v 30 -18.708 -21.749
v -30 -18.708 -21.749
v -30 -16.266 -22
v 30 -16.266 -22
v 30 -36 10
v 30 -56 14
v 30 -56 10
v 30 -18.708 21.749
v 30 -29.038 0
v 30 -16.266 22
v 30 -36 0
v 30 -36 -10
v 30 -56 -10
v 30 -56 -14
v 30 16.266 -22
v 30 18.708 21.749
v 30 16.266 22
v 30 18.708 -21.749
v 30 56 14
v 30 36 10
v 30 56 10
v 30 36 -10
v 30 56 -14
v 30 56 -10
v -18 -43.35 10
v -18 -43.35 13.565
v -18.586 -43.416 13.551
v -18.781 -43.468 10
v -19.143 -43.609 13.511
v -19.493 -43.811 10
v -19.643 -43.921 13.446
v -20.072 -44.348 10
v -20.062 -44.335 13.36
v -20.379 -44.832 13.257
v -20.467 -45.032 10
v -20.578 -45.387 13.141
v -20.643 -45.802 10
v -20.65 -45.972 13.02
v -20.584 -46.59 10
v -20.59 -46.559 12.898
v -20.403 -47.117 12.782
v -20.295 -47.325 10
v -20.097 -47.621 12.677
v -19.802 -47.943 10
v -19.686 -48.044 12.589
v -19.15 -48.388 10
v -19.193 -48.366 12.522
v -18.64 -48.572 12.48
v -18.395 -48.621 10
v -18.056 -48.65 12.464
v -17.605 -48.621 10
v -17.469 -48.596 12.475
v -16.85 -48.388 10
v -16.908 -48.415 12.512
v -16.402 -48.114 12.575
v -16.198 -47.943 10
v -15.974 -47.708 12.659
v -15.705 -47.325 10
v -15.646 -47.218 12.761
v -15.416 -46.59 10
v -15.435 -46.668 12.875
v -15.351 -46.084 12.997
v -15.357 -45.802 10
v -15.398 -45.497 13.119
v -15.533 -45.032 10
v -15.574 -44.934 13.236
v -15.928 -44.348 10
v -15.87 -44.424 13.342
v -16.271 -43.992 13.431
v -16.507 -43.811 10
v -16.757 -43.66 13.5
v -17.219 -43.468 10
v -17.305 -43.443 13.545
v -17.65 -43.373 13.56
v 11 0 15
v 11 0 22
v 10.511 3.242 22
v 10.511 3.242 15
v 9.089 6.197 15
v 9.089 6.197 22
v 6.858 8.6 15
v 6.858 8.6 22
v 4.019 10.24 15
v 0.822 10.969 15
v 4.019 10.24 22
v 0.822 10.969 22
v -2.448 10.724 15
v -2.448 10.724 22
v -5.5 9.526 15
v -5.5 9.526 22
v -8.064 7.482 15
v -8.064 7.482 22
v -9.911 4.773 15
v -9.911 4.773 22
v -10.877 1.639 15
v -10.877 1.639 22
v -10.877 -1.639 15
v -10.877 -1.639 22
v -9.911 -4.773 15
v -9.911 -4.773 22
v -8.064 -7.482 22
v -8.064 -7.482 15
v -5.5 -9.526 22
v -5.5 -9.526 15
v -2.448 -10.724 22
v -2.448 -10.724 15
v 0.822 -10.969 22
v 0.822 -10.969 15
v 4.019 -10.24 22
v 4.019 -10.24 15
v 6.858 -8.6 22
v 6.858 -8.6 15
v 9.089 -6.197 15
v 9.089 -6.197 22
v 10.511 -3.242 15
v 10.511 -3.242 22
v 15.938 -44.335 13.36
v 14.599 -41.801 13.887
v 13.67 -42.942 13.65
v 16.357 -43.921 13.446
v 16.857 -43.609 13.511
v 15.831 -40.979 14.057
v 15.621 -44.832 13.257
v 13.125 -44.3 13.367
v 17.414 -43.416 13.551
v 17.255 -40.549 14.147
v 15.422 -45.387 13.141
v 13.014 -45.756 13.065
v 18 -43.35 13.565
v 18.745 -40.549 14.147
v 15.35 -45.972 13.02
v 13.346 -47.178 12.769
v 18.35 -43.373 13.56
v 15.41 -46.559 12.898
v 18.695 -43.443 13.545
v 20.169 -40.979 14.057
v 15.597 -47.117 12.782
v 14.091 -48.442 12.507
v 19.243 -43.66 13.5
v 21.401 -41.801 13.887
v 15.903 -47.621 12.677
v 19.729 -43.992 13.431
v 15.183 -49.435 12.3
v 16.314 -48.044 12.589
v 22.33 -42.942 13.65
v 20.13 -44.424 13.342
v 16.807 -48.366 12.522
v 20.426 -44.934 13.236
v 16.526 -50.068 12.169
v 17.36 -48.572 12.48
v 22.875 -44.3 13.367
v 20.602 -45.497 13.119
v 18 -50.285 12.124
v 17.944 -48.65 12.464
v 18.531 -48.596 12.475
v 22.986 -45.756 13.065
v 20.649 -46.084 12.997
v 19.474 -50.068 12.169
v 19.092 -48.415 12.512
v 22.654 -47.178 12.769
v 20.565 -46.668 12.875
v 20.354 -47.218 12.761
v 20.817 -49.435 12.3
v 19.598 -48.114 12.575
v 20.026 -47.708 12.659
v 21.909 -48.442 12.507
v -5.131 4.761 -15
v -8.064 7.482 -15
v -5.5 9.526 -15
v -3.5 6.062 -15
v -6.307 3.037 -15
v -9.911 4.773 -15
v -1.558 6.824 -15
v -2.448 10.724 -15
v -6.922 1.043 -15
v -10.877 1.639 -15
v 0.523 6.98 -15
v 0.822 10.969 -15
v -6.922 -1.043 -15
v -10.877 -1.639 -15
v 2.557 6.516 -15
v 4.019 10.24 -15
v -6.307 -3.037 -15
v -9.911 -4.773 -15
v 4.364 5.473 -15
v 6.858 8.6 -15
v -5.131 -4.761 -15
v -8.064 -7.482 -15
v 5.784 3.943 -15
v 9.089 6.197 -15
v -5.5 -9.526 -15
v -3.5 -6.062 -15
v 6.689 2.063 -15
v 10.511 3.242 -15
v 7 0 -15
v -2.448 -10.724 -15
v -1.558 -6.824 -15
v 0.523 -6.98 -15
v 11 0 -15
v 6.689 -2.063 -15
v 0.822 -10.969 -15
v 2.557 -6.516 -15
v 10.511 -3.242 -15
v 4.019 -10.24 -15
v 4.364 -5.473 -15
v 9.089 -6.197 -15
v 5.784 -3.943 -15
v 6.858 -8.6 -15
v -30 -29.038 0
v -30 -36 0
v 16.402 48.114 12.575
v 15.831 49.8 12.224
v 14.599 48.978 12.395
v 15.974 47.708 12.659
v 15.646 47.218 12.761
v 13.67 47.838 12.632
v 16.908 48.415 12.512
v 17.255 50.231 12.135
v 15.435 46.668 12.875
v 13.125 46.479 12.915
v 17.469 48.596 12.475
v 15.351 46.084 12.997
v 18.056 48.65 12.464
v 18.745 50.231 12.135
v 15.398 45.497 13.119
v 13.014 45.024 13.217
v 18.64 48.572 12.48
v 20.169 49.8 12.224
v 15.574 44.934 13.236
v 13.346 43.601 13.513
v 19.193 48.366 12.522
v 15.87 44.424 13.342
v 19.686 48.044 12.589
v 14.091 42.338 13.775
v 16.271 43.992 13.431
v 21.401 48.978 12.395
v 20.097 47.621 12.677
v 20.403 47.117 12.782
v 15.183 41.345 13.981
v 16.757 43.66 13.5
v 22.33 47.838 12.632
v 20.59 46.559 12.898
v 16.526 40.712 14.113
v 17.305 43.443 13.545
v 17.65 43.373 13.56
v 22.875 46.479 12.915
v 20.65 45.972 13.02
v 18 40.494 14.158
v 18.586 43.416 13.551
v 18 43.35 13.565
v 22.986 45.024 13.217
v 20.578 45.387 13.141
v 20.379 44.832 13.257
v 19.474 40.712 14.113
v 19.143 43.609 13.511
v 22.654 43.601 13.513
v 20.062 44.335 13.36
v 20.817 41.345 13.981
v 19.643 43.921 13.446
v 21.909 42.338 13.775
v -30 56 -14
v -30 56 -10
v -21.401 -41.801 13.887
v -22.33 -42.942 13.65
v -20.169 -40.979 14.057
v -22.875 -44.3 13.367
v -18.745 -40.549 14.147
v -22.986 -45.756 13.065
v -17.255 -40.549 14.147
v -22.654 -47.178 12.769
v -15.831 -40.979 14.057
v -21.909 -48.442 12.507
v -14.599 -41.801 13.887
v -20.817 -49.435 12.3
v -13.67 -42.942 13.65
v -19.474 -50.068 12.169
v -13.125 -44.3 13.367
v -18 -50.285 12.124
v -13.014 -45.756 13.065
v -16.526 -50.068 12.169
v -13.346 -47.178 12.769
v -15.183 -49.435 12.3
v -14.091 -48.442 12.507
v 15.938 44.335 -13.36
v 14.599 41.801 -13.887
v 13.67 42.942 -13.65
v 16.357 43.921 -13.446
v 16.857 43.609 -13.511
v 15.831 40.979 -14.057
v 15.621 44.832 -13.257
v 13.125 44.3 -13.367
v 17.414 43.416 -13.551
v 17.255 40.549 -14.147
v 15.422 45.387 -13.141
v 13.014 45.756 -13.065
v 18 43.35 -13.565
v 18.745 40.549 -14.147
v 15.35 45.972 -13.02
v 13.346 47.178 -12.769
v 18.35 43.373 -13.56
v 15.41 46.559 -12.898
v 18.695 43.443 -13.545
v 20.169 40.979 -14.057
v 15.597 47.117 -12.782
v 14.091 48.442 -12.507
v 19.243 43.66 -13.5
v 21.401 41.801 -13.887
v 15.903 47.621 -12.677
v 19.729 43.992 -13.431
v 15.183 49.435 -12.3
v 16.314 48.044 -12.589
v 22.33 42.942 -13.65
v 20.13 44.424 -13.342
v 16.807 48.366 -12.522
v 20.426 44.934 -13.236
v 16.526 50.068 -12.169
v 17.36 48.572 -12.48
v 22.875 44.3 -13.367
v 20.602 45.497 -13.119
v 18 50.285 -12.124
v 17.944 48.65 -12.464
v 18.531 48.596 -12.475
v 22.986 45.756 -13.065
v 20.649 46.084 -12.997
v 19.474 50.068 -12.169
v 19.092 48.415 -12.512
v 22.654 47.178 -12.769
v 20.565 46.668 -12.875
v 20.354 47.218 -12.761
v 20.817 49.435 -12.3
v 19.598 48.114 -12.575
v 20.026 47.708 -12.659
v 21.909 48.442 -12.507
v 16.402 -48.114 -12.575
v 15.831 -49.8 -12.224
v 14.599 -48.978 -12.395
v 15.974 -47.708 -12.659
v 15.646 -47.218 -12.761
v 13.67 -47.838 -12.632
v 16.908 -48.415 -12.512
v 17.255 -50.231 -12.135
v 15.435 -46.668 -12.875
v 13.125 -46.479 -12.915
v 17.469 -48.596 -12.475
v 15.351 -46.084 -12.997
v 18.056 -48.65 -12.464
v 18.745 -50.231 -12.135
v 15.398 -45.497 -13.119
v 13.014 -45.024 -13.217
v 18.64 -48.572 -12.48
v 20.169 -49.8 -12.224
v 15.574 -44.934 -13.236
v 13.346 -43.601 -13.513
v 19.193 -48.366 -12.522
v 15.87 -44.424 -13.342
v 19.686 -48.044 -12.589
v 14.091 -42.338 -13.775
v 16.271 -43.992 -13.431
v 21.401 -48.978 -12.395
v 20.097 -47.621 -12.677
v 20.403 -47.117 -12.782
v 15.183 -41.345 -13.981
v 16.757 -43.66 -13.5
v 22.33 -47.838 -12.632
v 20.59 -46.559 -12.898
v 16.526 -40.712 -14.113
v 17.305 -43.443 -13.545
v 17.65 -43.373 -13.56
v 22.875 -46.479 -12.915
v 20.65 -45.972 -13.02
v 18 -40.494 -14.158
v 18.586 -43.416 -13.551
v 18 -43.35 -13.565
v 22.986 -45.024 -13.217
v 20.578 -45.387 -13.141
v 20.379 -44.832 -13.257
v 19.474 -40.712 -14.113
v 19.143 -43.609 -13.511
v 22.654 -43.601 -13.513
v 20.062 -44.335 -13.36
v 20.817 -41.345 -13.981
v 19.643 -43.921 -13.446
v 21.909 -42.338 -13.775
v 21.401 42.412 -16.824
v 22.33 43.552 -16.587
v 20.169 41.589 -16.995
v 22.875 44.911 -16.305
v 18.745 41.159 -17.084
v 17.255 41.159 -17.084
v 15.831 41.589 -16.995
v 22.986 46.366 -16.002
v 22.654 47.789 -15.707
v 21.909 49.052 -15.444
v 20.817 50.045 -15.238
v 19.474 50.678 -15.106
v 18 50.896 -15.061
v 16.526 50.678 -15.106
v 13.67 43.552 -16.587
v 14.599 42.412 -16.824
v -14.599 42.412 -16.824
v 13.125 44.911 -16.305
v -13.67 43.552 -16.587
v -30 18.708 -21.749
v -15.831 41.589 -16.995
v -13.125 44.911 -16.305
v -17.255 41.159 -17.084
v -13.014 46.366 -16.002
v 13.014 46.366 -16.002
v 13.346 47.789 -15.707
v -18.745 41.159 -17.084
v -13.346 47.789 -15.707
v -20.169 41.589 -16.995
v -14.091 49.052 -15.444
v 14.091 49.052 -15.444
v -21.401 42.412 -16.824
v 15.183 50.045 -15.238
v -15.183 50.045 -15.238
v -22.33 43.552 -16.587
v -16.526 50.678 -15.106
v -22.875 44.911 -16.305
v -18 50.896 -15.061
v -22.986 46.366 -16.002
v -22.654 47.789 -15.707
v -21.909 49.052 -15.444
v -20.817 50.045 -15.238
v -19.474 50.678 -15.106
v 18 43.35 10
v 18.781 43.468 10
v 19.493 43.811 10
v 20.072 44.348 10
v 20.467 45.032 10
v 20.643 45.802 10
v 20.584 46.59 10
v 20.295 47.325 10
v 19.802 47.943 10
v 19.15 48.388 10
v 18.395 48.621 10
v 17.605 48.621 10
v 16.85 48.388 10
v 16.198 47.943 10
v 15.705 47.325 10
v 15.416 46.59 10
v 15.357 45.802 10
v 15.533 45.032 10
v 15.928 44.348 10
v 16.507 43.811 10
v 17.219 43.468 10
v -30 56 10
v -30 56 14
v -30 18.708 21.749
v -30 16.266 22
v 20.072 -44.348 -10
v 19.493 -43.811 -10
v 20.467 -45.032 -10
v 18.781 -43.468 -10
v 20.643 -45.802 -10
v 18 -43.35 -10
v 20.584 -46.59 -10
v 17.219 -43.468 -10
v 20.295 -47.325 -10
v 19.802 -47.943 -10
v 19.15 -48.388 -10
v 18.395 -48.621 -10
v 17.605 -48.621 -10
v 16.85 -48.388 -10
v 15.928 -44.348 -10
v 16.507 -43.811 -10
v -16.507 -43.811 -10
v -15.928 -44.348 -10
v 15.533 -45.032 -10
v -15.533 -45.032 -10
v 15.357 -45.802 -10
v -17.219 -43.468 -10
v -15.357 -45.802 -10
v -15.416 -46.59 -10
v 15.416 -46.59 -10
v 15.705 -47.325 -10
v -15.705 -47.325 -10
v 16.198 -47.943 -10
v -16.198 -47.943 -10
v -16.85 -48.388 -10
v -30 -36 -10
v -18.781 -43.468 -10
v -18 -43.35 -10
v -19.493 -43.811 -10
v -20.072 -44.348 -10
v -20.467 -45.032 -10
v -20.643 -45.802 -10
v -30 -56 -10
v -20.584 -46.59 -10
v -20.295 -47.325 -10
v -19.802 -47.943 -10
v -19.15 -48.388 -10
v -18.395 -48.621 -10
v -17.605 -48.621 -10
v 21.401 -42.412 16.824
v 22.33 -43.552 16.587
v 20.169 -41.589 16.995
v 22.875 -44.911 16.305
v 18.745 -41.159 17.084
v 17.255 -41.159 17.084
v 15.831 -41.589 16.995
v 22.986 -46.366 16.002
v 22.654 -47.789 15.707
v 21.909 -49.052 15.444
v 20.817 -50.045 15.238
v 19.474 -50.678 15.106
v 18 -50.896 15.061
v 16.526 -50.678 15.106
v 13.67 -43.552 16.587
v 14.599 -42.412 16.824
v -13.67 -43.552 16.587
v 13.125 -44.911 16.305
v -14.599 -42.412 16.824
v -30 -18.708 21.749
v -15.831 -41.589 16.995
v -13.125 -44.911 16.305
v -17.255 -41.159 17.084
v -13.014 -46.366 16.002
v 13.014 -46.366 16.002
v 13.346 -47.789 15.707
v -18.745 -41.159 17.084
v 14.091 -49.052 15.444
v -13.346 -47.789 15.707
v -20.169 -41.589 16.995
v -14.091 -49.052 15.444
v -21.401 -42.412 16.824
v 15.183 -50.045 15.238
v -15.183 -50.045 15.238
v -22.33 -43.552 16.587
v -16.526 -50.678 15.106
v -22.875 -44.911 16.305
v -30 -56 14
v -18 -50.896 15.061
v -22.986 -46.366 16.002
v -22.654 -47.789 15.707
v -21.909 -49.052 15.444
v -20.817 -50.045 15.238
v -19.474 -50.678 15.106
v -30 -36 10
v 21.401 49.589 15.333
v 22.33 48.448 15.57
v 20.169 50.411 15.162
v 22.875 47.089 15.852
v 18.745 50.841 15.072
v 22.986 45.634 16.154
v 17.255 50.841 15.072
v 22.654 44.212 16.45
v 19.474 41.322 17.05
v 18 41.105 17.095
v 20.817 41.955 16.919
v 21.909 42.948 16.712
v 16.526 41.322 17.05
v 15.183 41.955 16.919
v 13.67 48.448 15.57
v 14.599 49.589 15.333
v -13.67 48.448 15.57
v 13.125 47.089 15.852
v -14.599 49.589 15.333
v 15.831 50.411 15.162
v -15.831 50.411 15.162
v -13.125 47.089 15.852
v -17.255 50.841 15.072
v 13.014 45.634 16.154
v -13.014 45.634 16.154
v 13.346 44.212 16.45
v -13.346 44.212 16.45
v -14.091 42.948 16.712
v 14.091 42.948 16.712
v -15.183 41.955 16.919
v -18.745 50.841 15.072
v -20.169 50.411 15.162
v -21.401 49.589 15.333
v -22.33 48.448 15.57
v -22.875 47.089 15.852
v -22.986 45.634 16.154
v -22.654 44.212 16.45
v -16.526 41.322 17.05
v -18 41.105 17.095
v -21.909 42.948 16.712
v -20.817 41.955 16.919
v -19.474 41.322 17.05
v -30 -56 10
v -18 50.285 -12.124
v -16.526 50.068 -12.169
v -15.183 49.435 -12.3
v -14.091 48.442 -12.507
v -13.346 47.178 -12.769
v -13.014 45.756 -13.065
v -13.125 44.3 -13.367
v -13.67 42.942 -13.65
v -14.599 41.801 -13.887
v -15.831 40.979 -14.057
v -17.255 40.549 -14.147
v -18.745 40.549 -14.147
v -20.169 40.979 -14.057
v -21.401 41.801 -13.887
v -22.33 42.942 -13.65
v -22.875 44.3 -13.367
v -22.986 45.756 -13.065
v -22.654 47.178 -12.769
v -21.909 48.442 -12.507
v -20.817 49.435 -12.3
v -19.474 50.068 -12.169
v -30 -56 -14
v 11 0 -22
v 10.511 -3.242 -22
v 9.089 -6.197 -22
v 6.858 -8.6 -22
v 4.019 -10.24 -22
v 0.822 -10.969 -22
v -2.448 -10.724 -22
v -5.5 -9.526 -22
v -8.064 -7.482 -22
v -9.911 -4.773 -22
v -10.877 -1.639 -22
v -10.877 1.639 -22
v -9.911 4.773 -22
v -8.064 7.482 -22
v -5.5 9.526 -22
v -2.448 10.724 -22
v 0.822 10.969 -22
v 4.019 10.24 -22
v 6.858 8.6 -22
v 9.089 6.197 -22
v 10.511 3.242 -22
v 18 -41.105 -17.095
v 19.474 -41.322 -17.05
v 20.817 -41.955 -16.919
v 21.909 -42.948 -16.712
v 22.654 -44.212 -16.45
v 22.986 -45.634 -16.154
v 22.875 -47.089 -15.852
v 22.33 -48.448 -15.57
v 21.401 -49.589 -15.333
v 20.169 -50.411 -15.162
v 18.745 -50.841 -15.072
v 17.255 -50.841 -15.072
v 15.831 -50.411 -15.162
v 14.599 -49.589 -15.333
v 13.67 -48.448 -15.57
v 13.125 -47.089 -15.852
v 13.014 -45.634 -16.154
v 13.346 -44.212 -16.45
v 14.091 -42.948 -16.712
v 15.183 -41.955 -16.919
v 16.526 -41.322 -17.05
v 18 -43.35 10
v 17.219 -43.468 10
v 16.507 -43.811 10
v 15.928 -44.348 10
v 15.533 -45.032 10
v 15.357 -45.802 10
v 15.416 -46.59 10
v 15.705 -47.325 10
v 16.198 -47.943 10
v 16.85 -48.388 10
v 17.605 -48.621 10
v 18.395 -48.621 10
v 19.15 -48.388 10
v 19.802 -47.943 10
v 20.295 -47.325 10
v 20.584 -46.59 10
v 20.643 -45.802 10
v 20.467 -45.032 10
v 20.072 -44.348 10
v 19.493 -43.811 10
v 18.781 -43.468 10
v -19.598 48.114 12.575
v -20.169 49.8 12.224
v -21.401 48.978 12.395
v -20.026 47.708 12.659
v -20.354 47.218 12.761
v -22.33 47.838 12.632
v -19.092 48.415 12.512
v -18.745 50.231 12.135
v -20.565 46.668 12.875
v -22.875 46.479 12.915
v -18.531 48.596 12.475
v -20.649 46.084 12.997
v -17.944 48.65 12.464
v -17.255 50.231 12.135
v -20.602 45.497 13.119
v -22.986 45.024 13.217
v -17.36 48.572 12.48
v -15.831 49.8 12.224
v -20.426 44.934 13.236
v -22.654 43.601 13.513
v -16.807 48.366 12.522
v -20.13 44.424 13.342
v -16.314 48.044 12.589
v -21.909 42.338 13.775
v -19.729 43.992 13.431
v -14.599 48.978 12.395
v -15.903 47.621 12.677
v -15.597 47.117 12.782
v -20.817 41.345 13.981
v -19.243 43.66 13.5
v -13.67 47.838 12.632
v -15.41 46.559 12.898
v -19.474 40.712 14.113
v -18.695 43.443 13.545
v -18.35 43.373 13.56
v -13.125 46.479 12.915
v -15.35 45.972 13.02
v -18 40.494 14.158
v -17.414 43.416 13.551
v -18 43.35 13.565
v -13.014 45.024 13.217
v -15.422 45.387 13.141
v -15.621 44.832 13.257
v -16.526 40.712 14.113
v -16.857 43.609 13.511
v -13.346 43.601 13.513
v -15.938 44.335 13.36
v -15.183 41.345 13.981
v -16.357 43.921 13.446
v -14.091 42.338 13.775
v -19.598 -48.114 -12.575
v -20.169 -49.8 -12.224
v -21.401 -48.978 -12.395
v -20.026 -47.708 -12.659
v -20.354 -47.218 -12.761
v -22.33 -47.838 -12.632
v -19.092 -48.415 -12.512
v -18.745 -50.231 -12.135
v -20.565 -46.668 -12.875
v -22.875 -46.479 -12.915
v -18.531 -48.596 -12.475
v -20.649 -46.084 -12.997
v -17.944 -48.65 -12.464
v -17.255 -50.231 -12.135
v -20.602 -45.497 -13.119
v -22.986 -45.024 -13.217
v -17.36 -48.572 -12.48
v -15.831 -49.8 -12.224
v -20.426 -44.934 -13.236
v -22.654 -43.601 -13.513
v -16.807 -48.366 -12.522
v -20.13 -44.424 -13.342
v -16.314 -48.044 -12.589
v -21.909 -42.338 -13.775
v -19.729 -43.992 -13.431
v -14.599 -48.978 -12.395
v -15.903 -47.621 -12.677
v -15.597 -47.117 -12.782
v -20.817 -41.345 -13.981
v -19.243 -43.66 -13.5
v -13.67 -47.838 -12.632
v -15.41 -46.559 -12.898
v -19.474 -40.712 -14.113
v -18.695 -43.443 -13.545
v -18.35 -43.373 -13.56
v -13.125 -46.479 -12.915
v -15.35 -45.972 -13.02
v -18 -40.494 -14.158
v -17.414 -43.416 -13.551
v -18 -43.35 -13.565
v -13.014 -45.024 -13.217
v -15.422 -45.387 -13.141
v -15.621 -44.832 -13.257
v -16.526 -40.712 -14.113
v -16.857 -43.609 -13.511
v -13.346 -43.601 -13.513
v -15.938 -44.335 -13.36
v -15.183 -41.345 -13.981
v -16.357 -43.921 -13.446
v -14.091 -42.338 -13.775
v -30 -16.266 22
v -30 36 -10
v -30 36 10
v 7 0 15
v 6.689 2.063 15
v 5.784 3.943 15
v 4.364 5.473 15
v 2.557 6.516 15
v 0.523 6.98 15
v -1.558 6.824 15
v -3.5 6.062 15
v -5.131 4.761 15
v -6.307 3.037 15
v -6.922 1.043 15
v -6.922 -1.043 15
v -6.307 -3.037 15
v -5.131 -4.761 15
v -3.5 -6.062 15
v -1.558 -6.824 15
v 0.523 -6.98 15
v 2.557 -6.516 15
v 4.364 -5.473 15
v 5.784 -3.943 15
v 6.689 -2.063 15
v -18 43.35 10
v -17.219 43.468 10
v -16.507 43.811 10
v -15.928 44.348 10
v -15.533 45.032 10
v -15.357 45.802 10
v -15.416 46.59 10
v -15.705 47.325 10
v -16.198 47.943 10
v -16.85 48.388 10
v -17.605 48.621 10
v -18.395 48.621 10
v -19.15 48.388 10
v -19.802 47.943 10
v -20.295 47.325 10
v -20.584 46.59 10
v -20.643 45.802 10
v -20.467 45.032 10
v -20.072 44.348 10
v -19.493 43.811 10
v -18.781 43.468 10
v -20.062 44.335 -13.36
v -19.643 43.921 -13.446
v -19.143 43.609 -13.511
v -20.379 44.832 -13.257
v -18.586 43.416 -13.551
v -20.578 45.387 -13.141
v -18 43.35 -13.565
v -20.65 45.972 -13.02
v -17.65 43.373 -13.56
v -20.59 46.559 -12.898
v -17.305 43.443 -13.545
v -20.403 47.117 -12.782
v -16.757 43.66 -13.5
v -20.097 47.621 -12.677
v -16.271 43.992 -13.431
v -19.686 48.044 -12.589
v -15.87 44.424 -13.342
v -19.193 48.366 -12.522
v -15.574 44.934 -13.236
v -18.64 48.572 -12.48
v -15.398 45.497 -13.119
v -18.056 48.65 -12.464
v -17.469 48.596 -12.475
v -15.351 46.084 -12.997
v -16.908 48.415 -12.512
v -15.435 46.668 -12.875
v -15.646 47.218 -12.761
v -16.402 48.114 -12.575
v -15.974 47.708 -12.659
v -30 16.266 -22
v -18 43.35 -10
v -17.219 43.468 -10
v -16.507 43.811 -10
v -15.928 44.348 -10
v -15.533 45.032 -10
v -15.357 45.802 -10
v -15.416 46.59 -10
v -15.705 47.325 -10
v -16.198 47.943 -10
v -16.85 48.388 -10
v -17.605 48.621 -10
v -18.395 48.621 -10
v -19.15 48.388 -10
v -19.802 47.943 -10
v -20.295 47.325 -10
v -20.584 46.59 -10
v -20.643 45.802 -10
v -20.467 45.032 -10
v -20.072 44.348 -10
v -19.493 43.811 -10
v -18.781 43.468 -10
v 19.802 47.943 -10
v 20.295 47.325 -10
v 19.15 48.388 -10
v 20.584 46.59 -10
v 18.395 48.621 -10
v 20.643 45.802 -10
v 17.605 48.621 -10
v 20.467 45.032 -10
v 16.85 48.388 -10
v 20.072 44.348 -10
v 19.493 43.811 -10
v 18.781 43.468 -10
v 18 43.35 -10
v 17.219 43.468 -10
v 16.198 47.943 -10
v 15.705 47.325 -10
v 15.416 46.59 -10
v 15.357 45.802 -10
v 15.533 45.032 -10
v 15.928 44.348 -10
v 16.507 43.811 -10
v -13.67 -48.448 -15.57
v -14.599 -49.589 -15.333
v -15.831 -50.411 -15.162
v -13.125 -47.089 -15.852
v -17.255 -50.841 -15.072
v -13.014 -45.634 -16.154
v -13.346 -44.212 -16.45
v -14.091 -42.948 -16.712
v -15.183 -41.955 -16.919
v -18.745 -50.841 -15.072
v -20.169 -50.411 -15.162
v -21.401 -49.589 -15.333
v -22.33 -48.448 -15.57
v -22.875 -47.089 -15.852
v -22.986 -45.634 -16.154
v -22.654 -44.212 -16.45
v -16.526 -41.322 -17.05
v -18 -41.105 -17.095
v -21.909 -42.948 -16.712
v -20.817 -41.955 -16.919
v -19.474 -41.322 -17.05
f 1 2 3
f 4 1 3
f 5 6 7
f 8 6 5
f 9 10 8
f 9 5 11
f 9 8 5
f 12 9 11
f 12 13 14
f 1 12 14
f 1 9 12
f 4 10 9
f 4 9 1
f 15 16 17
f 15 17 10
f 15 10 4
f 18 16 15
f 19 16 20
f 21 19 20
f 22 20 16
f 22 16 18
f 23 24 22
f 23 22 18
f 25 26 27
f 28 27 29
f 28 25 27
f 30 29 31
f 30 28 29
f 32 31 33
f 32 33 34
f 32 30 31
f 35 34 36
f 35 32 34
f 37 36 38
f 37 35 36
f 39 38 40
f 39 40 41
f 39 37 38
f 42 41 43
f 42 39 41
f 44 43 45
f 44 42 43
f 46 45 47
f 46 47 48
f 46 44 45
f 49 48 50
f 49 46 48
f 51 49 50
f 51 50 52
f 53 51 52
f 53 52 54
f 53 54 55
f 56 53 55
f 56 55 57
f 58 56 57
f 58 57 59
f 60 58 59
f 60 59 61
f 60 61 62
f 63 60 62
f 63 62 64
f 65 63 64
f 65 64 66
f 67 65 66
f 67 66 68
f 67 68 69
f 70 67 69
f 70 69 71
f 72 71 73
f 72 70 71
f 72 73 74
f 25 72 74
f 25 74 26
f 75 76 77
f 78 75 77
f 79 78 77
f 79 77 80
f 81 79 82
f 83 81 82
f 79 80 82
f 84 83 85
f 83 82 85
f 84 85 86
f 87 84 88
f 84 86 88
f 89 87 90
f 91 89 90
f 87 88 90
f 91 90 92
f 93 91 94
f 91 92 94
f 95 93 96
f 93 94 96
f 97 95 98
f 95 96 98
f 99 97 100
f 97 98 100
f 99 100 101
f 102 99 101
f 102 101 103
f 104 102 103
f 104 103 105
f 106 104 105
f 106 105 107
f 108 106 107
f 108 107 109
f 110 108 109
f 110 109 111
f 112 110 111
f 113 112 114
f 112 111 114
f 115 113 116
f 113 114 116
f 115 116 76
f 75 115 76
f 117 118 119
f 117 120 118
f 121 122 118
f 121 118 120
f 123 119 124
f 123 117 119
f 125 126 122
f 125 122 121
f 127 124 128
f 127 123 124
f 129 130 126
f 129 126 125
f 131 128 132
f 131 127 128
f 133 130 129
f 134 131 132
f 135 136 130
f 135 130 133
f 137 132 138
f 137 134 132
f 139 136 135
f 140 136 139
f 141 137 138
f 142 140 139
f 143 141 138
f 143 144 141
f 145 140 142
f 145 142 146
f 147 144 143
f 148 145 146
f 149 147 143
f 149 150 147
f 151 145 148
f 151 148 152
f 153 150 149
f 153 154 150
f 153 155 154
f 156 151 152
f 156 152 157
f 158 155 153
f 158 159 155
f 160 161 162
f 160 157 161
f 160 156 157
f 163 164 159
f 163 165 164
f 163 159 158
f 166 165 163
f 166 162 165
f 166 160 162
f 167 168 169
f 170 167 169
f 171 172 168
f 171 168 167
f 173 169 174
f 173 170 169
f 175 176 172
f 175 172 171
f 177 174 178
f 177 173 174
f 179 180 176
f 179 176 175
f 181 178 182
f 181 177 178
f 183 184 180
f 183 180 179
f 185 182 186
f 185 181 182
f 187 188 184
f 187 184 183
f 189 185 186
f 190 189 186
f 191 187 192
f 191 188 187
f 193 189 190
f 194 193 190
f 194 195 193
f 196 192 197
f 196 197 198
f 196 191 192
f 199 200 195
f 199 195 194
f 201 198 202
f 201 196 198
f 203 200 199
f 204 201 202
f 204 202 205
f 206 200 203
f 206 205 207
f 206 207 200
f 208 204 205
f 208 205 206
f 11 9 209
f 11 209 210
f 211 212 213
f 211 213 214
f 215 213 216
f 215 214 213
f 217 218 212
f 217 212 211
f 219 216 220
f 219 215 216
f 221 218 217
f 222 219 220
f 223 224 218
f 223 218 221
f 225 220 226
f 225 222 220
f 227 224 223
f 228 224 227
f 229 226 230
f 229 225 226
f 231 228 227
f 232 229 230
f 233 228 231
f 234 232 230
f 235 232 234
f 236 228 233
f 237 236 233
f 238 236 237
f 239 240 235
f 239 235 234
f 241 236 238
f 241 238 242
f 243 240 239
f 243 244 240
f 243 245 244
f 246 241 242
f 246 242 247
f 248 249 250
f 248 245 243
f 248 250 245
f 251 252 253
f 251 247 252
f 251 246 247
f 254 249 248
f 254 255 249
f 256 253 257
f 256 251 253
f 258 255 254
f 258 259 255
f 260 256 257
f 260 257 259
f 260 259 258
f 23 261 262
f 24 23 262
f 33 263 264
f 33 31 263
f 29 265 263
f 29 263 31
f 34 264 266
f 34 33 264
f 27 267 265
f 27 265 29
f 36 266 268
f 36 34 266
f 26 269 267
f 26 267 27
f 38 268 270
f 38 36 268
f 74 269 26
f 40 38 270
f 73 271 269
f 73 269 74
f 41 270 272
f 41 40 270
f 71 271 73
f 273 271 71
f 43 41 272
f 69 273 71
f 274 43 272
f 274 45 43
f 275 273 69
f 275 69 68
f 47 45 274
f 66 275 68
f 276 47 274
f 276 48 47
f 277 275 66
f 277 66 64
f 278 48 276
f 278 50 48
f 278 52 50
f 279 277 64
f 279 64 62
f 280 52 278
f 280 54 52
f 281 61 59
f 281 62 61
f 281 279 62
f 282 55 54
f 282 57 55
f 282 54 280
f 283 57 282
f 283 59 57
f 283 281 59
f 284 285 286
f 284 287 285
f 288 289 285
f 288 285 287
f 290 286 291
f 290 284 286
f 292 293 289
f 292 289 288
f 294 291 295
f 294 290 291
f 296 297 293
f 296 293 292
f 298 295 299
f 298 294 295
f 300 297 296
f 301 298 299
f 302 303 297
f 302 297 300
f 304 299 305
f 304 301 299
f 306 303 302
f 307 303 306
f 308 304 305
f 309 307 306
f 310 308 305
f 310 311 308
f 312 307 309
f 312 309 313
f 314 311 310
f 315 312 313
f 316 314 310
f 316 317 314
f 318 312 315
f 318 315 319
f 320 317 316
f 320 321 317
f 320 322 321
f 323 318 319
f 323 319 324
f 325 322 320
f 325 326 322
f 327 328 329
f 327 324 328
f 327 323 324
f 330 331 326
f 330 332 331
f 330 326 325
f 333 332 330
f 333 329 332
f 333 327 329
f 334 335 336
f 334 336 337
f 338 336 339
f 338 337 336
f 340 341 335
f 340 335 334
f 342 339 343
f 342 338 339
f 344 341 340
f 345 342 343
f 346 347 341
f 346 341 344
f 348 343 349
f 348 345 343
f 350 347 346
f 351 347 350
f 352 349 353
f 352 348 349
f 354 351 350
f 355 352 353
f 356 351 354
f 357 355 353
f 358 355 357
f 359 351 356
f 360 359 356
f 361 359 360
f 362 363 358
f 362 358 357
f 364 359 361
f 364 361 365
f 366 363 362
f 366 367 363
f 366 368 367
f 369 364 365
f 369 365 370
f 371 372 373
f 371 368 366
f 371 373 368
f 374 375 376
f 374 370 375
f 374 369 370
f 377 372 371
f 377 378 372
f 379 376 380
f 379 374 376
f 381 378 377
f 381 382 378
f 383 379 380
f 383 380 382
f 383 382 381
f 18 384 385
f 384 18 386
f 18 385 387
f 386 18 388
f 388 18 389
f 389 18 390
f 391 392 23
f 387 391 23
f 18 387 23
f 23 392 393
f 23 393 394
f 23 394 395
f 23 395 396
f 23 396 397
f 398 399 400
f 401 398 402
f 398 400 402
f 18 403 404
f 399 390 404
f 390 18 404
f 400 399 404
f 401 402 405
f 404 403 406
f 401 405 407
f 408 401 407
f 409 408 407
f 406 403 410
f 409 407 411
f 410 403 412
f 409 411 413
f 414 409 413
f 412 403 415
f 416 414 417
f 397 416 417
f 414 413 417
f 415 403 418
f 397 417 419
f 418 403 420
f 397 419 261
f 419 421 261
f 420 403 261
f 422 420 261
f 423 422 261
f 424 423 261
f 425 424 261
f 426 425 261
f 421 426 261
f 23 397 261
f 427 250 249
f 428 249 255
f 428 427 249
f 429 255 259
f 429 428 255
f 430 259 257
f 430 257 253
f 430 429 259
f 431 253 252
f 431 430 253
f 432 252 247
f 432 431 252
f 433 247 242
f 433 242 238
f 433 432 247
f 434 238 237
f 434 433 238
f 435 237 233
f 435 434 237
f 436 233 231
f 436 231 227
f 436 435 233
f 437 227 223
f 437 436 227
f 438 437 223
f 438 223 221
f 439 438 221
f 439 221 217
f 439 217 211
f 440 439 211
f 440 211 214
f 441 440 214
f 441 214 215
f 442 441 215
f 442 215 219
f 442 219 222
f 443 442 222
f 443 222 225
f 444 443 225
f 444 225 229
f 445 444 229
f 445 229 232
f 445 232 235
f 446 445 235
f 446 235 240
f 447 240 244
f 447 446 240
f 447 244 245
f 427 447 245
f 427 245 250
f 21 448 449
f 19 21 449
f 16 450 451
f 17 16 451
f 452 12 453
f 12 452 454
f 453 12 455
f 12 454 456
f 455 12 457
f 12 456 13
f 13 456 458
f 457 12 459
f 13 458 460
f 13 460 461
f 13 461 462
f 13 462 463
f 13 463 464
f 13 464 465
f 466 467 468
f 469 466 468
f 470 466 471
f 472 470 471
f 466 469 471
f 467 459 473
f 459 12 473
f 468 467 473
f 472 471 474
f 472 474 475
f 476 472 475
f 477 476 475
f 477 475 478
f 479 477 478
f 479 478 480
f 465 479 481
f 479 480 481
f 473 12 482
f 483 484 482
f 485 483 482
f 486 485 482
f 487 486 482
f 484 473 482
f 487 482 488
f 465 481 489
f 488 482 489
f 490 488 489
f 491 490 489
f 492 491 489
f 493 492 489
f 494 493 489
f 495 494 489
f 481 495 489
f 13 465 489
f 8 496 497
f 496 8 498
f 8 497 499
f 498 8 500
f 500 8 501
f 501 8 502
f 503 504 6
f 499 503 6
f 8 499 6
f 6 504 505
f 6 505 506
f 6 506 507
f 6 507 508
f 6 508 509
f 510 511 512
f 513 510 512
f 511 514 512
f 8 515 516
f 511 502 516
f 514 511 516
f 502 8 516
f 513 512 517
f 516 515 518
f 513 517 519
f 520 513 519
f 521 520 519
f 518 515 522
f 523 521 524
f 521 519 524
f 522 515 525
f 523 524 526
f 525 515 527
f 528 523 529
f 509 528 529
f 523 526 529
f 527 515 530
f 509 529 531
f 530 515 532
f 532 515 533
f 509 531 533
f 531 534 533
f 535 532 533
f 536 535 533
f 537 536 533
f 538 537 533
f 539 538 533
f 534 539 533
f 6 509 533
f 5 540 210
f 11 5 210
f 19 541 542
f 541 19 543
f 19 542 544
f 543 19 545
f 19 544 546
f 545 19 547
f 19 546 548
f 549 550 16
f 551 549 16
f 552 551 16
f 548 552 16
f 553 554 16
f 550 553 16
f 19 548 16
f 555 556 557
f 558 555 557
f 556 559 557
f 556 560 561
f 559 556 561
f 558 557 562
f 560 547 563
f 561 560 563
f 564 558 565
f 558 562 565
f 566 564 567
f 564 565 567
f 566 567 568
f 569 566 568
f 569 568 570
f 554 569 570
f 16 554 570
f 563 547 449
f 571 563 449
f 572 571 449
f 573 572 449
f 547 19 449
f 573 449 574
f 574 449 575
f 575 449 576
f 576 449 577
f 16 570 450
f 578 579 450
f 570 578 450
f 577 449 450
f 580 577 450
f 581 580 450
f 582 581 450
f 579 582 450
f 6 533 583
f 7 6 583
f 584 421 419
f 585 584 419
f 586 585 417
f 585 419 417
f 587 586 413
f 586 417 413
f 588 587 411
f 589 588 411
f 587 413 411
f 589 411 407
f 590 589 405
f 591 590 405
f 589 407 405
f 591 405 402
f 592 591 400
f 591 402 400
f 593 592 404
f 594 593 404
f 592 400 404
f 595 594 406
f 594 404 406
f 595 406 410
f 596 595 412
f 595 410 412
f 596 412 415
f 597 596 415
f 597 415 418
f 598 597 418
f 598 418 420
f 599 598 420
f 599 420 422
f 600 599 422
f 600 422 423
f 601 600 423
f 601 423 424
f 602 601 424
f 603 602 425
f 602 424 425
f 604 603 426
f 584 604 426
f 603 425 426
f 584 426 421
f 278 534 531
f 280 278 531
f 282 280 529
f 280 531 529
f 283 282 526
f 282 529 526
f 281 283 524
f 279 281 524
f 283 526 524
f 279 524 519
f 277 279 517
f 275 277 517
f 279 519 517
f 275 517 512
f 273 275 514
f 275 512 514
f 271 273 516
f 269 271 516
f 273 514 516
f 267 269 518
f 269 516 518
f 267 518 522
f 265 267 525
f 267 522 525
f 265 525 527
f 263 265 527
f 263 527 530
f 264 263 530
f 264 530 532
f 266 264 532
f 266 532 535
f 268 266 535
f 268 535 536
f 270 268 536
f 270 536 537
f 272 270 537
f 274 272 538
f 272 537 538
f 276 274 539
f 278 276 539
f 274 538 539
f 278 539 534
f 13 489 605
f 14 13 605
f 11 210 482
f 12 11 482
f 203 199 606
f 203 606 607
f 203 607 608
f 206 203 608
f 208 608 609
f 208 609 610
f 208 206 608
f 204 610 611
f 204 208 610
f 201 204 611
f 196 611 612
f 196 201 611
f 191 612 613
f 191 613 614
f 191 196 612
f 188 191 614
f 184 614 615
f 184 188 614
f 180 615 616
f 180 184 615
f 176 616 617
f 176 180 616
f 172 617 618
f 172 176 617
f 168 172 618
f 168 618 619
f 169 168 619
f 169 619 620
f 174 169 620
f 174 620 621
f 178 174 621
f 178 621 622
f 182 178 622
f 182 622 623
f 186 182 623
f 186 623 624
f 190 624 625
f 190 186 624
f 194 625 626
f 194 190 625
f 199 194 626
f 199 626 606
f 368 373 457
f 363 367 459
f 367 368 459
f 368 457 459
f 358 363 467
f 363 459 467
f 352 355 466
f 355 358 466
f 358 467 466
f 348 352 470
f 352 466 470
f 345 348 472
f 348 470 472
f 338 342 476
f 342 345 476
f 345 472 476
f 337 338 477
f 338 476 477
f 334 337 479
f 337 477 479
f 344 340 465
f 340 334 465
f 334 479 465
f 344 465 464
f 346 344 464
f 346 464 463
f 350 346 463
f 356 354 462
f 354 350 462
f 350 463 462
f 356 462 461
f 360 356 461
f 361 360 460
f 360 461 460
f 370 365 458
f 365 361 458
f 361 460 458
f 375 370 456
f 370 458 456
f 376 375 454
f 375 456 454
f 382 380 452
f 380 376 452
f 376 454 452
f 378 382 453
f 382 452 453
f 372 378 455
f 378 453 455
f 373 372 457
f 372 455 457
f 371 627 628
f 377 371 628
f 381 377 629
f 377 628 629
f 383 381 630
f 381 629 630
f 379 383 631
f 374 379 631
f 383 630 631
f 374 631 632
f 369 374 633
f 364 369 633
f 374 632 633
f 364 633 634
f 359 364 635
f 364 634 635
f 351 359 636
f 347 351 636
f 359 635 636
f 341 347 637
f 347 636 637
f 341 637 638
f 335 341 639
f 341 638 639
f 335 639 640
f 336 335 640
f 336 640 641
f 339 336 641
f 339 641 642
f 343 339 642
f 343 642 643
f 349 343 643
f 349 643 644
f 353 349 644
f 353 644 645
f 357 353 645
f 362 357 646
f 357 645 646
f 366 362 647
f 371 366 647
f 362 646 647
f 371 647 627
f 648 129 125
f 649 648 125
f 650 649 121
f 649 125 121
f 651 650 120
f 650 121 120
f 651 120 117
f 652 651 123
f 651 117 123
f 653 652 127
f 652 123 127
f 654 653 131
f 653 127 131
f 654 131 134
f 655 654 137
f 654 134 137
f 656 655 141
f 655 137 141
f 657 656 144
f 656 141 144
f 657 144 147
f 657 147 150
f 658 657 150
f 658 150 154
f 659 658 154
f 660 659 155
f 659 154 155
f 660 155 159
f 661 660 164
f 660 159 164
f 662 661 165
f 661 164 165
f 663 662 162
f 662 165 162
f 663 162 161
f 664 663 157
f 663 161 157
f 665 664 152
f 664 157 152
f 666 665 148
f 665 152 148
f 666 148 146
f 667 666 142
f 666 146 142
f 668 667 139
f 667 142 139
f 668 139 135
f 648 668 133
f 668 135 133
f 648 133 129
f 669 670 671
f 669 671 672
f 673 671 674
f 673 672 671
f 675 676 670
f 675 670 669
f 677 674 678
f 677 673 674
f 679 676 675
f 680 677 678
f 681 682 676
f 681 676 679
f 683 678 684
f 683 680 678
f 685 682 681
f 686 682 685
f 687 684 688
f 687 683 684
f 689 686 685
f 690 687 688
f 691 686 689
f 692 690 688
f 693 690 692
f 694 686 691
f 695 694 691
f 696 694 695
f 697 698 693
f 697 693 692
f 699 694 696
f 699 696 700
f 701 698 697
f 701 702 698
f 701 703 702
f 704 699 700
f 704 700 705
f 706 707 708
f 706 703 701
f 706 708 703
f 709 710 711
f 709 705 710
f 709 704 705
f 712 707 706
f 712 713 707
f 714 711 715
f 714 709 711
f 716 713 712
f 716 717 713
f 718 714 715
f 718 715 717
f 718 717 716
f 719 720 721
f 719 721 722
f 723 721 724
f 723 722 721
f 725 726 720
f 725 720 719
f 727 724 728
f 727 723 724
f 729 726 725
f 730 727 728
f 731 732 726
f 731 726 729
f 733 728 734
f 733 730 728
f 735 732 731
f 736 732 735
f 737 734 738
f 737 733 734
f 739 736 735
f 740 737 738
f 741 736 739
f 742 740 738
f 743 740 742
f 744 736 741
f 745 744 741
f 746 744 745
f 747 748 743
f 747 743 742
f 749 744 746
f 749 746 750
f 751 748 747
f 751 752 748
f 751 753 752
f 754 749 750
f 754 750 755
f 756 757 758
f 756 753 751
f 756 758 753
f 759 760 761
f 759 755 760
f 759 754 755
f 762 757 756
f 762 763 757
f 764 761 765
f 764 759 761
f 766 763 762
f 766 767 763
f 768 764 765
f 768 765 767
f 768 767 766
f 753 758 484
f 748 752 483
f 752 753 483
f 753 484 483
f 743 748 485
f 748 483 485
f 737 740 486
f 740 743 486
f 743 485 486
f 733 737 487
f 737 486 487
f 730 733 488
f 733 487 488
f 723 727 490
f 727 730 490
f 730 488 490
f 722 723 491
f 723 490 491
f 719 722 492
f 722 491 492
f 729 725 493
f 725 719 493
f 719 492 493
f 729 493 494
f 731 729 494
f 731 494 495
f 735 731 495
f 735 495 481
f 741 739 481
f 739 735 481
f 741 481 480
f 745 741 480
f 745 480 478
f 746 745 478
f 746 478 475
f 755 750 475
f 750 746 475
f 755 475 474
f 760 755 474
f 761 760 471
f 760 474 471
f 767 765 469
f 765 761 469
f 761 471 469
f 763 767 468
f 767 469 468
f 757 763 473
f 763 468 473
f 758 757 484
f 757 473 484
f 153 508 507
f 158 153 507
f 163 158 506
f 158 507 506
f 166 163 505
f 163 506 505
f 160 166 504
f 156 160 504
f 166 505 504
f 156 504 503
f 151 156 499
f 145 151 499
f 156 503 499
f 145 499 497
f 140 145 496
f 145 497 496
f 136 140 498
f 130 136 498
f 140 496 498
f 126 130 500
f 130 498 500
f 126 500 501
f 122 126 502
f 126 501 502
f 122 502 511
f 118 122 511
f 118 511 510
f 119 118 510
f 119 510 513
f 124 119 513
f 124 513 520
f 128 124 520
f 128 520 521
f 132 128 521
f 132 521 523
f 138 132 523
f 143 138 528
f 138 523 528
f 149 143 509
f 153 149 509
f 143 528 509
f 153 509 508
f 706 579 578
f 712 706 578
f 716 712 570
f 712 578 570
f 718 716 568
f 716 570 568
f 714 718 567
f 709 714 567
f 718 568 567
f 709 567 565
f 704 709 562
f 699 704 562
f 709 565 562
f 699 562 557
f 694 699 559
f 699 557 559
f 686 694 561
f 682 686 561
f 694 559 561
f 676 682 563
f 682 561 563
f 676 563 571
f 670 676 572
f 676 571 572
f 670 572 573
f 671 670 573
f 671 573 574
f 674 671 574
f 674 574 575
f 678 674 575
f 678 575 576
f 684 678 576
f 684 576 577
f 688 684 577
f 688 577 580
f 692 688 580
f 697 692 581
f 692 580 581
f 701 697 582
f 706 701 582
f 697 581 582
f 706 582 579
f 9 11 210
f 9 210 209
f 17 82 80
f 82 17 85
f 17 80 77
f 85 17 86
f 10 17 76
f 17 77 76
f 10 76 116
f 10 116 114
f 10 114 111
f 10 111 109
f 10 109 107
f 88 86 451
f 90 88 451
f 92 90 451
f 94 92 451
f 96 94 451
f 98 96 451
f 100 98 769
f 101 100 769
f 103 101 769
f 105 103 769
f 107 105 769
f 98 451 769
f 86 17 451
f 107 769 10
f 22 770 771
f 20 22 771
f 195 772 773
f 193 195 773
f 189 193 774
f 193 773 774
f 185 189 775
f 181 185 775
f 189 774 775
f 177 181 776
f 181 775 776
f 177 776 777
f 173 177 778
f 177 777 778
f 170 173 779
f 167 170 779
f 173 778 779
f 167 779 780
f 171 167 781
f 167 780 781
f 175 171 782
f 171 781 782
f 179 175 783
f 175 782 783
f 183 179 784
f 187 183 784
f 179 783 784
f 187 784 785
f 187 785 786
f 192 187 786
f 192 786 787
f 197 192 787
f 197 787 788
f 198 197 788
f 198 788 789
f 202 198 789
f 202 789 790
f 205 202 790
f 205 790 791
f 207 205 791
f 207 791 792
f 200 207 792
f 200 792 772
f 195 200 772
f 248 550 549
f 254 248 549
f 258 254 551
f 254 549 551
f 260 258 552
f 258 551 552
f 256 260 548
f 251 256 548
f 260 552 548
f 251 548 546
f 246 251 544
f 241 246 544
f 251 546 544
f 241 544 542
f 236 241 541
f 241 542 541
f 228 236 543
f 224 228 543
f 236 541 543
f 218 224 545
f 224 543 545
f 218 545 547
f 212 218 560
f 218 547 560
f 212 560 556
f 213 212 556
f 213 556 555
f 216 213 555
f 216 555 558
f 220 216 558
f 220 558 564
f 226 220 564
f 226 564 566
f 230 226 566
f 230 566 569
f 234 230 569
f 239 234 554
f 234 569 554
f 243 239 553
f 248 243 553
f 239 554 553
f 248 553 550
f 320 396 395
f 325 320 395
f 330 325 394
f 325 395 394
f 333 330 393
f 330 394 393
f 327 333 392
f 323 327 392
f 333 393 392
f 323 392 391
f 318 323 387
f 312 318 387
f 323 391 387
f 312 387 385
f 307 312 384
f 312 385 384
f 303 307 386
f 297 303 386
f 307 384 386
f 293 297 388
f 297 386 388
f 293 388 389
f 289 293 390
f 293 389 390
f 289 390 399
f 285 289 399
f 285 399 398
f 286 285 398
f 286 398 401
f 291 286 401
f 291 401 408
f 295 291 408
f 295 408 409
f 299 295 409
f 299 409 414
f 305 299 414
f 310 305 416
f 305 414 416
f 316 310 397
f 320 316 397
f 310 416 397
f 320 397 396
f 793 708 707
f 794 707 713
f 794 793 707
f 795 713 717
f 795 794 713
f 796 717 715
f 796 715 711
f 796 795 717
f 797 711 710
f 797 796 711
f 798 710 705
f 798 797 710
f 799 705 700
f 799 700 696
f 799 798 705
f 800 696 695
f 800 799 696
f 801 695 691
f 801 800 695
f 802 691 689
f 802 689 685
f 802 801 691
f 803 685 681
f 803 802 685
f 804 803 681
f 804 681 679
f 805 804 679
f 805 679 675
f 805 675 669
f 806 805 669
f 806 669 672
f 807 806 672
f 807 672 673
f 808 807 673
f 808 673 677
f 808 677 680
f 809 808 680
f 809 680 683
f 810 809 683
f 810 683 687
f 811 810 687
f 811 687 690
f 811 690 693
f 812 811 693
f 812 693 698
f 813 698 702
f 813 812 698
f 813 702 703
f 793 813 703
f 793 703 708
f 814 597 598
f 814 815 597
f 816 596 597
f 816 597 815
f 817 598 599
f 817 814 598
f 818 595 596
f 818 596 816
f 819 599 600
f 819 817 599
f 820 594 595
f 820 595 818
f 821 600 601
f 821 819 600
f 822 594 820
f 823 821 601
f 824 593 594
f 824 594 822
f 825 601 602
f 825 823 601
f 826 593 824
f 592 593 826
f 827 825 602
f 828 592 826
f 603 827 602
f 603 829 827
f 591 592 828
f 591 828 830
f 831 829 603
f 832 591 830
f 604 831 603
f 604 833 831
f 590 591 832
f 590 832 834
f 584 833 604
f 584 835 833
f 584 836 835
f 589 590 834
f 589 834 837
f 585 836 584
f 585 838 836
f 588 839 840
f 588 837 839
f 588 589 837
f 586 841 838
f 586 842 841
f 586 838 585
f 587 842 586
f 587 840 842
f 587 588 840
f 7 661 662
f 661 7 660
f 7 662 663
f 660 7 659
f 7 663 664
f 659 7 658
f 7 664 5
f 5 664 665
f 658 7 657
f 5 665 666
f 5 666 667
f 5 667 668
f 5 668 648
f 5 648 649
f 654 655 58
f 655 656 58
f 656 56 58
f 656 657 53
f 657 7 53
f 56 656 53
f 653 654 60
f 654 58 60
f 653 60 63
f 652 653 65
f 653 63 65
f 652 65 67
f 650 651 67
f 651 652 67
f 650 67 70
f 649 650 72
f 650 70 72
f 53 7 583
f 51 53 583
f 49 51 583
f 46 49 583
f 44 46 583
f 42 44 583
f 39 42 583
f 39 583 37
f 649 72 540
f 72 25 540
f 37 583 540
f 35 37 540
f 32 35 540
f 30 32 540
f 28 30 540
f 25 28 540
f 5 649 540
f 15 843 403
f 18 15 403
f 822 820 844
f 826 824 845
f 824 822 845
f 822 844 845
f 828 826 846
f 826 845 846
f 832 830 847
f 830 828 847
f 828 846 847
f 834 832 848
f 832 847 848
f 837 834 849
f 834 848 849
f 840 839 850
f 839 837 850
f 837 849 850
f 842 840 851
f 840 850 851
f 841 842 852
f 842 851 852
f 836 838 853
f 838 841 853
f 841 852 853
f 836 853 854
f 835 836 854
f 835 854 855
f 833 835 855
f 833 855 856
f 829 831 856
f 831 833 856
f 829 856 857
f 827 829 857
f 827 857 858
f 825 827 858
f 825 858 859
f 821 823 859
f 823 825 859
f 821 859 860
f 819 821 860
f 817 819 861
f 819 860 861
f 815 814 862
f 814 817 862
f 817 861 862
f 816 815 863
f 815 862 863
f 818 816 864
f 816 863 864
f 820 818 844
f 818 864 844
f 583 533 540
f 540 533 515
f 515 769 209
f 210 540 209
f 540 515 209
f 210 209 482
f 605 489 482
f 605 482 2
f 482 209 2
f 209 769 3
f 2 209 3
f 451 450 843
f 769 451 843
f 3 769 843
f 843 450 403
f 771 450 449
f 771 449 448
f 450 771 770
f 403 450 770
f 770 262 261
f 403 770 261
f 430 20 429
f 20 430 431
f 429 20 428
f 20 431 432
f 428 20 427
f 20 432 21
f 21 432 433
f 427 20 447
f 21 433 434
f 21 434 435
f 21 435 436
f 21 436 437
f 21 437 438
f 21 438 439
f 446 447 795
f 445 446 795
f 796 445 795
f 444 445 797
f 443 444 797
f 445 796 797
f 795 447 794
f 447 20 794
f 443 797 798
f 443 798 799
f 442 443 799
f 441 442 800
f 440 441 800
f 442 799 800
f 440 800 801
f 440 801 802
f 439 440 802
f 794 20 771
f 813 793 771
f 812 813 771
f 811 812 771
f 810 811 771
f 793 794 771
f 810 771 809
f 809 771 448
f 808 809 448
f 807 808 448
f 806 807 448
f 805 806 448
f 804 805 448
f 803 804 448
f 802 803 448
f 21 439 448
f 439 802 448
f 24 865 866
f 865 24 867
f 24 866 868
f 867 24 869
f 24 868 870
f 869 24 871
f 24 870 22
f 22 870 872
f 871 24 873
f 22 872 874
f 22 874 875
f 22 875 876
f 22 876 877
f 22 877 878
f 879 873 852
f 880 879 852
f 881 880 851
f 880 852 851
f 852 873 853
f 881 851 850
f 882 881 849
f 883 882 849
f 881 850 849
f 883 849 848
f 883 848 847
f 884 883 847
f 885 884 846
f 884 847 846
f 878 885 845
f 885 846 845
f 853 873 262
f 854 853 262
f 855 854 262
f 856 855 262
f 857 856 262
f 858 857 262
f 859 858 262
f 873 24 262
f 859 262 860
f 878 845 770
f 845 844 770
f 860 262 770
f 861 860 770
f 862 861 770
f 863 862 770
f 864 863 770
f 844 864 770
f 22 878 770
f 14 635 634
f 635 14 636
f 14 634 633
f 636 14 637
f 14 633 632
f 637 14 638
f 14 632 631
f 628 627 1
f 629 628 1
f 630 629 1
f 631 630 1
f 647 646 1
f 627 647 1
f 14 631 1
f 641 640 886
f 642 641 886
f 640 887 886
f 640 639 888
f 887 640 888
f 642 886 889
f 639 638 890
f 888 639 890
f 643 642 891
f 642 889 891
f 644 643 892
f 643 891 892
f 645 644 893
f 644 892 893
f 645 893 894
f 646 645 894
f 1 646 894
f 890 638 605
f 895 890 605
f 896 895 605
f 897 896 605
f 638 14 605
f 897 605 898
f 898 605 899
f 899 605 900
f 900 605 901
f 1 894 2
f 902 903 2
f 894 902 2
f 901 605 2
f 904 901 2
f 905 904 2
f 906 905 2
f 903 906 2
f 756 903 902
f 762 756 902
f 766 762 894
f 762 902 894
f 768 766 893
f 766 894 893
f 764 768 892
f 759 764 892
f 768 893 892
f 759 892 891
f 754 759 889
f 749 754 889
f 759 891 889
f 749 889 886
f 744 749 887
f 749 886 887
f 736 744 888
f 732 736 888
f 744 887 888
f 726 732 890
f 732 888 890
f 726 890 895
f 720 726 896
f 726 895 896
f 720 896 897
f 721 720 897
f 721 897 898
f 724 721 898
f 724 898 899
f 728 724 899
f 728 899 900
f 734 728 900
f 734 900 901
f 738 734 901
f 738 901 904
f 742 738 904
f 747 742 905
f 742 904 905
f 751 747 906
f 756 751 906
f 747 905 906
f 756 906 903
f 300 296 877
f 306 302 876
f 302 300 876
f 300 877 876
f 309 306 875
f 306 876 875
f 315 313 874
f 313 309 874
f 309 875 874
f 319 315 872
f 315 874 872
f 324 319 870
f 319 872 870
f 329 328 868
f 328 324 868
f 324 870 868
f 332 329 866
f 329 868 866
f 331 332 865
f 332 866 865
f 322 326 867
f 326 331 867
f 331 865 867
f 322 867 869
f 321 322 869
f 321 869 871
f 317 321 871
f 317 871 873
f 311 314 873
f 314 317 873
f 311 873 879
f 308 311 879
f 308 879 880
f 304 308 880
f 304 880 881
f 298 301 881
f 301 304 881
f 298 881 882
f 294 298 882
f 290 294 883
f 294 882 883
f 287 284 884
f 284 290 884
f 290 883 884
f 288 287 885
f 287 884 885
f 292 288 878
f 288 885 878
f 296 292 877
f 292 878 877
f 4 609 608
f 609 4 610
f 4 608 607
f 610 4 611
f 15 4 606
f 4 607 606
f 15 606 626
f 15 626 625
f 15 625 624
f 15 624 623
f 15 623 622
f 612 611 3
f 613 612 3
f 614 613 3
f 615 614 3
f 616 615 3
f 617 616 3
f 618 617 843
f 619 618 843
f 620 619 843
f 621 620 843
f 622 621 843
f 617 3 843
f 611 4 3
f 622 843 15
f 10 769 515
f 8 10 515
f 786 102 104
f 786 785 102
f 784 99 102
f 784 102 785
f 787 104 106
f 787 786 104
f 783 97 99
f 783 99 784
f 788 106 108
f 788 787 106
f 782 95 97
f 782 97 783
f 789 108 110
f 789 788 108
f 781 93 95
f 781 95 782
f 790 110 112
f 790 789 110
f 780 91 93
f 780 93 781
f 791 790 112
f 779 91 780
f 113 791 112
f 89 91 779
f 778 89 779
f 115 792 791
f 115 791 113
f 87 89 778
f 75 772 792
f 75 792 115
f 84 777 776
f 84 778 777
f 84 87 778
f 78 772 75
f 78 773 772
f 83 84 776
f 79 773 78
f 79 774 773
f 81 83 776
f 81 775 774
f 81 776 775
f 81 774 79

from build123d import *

# Parameters (mm, degrees)
EXTRUIR_L_MINA1_START   = -30
EXTRUIR_L_MINA1_DEPTH   = 60
CROQUIS2_W              = 29.989677058
CROQUIS2_H              = 58.075247638
SALIENTE_EXTRUIR1_DEPTH = 30
CROQUIS3_R              = 7
CORTAR_EXTRUIR1_DEPTH   = 60
CROQUIS4_R              = 11
CORTAR_EXTRUIR2_DEPTH   = 7
CORTAR_EXTRUIR3_START   = -7
CROQUIS5_R              = 11
CORTAR_EXTRUIR3_DEPTH   = 7
CROQUIS7_R              = 2.65
CORTAR_EXTRUIR4_DEPTH   = 30
CROQUIS8_R              = 5
CORTAR_EXTRUIR5_DEPTH   = 3
CROQUIS9_R              = 5
CORTAR_EXTRUIR6_DEPTH   = 3
CROQUIS10_R             = 5
CORTAR_EXTRUIR7_DEPTH   = 3
CROQUIS11_R             = 5
CORTAR_EXTRUIR8_DEPTH   = 3


# Read off the part's stored shape, not the designer's step: Extruir-Lámina1
with BuildPart() as part:
    # Extruir-Lámina1 outline → Extruir-Lámina1 (new body)
    with BuildSketch(Plane(origin=(0, 0, 0), x_dir=(0, 0, -1), z_dir=(1, 0, 0)).offset(EXTRUIR_L_MINA1_START)):
        Polygon((10.020236328, -26.000123541), (0.000367551, -26.000123541), (0.000367551, -36.000123541), (10.000367551, -36.000123541), (10.000367551, -56.000123541), (14.000367551, -56.000123541), (21.74906786, -18.707636838), (22, -16.2665), (22, 16.2665), (21.74906786, 18.707636838), (14.000367551, 56.000123541), (10.000367551, 56.000123541), (10.000367551, 36.000123541), (-10.000367551, 36.000123541), (-10.000367551, 56.000123541), (-14.000367551, 56.000123541), (-21.74906786, 18.707636838), (-22, 16.2665), (-22, -16.2665), (-21.74906786, -18.707636838), (-14.000367551, -56.000123541), (-10.000367551, -56.000123541), (-10.000367551, -36.000123541), (-0.000367551, -36.000123541), (-0.000367551, -26.000123541), (-10.020236328, -26.000123541), (-11.853902107, -17.175165292), (-12, -15.753884831), (-12, 15.753884831), (-11.853902107, 17.175165292), (-10.020236328, 26.000123541), (10.020236328, 26.000123541), (11.853902107, 17.175165292), (12, 15.753884831), (12, -15.753884831), (11.853902107, -17.175165292), align=None)
    extrude(amount=EXTRUIR_L_MINA1_DEPTH)

    # Croquis2 → Saliente-Extruir1 (add, symmetric)
    with BuildSketch(Plane(origin=(0, 0, 0), x_dir=(0, 0, -1), z_dir=(1, 0, 0))):
        Rectangle(CROQUIS2_W, CROQUIS2_H)
    extrude(amount=SALIENTE_EXTRUIR1_DEPTH, both=True)

    # Croquis3 → Cortar-Extruir1 (cut)
    with BuildSketch(Plane.XY.offset(22)):
        Circle(CROQUIS3_R)
    extrude(amount=-CORTAR_EXTRUIR1_DEPTH, mode=Mode.SUBTRACT)

    # Croquis4 → Cortar-Extruir2 (cut)
    with BuildSketch(Plane.XY.offset(22)):
        Circle(CROQUIS4_R)
    extrude(amount=-CORTAR_EXTRUIR2_DEPTH, mode=Mode.SUBTRACT)

    # Croquis5 → Cortar-Extruir3 (cut)
    with BuildSketch(Plane(origin=(0, 0, -22), x_dir=(-1, 0, 0), z_dir=(0, 0, -1)).offset(CORTAR_EXTRUIR3_START)):
        with Locations(Location((0, 0, 0), (0, 0, 180))):
            Circle(CROQUIS5_R)
    extrude(amount=CORTAR_EXTRUIR3_DEPTH, mode=Mode.SUBTRACT)

    # Croquis7 → Cortar-Extruir4 (cut, symmetric)
    with BuildSketch(Plane.XY):
        with Locations(Location((-18, 46.000123541, 0), (0, 0, 270))):
            Circle(CROQUIS7_R)
        with Locations(Location((18, 46.000123541, 0), (0, 0, 270))):
            Circle(CROQUIS7_R)
        with Locations(Location((-18, -46.000123541, 0), (0, 0, 90))):
            Circle(CROQUIS7_R)
        with Locations(Location((18, -46.000123541, 0), (0, 0, 90))):
            Circle(CROQUIS7_R)
    extrude(amount=CORTAR_EXTRUIR4_DEPTH, both=True, mode=Mode.SUBTRACT)

    # Croquis8 → Cortar-Extruir5 (cut)
    with BuildSketch(Plane(origin=(0, 5.106275996, 24.575183206), x_dir=(1, 0, 0), z_dir=(0, 0.20343669587104055, 0.979088101640028))):
        with Locations(Location((-18, 41.767280673, 0), (0, 0, 270))):
            Circle(CROQUIS8_R)
        with Locations(Location((18, 41.767280673, 0), (0, 0, 270))):
            Circle(CROQUIS8_R)
    extrude(amount=-CORTAR_EXTRUIR5_DEPTH, mode=Mode.SUBTRACT)

    # Croquis9 → Cortar-Extruir6 (cut)
    with BuildSketch(Plane(origin=(0, -5.106275996, 24.575183206), x_dir=(1, 0, 0), z_dir=(0, -0.2034366958710477, 0.9790881016400266))):
        with Locations(Location((-18, -41.767280673, 0), (0, 0, 270))):
            Circle(CROQUIS9_R)
        with Locations(Location((18, -41.767280673, 0), (0, 0, 270))):
            Circle(CROQUIS9_R)
    extrude(amount=-CORTAR_EXTRUIR6_DEPTH, mode=Mode.SUBTRACT)

    # Croquis10 → Cortar-Extruir7 (cut)
    with BuildSketch(Plane(origin=(0, 5.106275996, -24.575183206), x_dir=(-1, 0, 0), z_dir=(0, 0.2034366958710399, -0.9790881016400281))):
        with Locations(Location((-18, 41.767280673, 0), (0, 0, 90))):
            Circle(CROQUIS10_R)
        with Locations(Location((18, 41.767280673, 0), (0, 0, 90))):
            Circle(CROQUIS10_R)
    extrude(amount=-CORTAR_EXTRUIR7_DEPTH, mode=Mode.SUBTRACT)

    # Croquis11 → Cortar-Extruir8 (cut)
    with BuildSketch(Plane(origin=(0, -5.106275996, -24.575183206), x_dir=(-1, 0, 0), z_dir=(0, -0.20343669587104735, -0.9790881016400267))):
        with Locations(Location((-18, -41.767280673, 0), (0, 0, 90))):
            Circle(CROQUIS11_R)
        with Locations(Location((18, -41.767280673, 0), (0, 0, 90))):
            Circle(CROQUIS11_R)
    extrude(amount=-CORTAR_EXTRUIR8_DEPTH, mode=Mode.SUBTRACT)


solid = part.part
